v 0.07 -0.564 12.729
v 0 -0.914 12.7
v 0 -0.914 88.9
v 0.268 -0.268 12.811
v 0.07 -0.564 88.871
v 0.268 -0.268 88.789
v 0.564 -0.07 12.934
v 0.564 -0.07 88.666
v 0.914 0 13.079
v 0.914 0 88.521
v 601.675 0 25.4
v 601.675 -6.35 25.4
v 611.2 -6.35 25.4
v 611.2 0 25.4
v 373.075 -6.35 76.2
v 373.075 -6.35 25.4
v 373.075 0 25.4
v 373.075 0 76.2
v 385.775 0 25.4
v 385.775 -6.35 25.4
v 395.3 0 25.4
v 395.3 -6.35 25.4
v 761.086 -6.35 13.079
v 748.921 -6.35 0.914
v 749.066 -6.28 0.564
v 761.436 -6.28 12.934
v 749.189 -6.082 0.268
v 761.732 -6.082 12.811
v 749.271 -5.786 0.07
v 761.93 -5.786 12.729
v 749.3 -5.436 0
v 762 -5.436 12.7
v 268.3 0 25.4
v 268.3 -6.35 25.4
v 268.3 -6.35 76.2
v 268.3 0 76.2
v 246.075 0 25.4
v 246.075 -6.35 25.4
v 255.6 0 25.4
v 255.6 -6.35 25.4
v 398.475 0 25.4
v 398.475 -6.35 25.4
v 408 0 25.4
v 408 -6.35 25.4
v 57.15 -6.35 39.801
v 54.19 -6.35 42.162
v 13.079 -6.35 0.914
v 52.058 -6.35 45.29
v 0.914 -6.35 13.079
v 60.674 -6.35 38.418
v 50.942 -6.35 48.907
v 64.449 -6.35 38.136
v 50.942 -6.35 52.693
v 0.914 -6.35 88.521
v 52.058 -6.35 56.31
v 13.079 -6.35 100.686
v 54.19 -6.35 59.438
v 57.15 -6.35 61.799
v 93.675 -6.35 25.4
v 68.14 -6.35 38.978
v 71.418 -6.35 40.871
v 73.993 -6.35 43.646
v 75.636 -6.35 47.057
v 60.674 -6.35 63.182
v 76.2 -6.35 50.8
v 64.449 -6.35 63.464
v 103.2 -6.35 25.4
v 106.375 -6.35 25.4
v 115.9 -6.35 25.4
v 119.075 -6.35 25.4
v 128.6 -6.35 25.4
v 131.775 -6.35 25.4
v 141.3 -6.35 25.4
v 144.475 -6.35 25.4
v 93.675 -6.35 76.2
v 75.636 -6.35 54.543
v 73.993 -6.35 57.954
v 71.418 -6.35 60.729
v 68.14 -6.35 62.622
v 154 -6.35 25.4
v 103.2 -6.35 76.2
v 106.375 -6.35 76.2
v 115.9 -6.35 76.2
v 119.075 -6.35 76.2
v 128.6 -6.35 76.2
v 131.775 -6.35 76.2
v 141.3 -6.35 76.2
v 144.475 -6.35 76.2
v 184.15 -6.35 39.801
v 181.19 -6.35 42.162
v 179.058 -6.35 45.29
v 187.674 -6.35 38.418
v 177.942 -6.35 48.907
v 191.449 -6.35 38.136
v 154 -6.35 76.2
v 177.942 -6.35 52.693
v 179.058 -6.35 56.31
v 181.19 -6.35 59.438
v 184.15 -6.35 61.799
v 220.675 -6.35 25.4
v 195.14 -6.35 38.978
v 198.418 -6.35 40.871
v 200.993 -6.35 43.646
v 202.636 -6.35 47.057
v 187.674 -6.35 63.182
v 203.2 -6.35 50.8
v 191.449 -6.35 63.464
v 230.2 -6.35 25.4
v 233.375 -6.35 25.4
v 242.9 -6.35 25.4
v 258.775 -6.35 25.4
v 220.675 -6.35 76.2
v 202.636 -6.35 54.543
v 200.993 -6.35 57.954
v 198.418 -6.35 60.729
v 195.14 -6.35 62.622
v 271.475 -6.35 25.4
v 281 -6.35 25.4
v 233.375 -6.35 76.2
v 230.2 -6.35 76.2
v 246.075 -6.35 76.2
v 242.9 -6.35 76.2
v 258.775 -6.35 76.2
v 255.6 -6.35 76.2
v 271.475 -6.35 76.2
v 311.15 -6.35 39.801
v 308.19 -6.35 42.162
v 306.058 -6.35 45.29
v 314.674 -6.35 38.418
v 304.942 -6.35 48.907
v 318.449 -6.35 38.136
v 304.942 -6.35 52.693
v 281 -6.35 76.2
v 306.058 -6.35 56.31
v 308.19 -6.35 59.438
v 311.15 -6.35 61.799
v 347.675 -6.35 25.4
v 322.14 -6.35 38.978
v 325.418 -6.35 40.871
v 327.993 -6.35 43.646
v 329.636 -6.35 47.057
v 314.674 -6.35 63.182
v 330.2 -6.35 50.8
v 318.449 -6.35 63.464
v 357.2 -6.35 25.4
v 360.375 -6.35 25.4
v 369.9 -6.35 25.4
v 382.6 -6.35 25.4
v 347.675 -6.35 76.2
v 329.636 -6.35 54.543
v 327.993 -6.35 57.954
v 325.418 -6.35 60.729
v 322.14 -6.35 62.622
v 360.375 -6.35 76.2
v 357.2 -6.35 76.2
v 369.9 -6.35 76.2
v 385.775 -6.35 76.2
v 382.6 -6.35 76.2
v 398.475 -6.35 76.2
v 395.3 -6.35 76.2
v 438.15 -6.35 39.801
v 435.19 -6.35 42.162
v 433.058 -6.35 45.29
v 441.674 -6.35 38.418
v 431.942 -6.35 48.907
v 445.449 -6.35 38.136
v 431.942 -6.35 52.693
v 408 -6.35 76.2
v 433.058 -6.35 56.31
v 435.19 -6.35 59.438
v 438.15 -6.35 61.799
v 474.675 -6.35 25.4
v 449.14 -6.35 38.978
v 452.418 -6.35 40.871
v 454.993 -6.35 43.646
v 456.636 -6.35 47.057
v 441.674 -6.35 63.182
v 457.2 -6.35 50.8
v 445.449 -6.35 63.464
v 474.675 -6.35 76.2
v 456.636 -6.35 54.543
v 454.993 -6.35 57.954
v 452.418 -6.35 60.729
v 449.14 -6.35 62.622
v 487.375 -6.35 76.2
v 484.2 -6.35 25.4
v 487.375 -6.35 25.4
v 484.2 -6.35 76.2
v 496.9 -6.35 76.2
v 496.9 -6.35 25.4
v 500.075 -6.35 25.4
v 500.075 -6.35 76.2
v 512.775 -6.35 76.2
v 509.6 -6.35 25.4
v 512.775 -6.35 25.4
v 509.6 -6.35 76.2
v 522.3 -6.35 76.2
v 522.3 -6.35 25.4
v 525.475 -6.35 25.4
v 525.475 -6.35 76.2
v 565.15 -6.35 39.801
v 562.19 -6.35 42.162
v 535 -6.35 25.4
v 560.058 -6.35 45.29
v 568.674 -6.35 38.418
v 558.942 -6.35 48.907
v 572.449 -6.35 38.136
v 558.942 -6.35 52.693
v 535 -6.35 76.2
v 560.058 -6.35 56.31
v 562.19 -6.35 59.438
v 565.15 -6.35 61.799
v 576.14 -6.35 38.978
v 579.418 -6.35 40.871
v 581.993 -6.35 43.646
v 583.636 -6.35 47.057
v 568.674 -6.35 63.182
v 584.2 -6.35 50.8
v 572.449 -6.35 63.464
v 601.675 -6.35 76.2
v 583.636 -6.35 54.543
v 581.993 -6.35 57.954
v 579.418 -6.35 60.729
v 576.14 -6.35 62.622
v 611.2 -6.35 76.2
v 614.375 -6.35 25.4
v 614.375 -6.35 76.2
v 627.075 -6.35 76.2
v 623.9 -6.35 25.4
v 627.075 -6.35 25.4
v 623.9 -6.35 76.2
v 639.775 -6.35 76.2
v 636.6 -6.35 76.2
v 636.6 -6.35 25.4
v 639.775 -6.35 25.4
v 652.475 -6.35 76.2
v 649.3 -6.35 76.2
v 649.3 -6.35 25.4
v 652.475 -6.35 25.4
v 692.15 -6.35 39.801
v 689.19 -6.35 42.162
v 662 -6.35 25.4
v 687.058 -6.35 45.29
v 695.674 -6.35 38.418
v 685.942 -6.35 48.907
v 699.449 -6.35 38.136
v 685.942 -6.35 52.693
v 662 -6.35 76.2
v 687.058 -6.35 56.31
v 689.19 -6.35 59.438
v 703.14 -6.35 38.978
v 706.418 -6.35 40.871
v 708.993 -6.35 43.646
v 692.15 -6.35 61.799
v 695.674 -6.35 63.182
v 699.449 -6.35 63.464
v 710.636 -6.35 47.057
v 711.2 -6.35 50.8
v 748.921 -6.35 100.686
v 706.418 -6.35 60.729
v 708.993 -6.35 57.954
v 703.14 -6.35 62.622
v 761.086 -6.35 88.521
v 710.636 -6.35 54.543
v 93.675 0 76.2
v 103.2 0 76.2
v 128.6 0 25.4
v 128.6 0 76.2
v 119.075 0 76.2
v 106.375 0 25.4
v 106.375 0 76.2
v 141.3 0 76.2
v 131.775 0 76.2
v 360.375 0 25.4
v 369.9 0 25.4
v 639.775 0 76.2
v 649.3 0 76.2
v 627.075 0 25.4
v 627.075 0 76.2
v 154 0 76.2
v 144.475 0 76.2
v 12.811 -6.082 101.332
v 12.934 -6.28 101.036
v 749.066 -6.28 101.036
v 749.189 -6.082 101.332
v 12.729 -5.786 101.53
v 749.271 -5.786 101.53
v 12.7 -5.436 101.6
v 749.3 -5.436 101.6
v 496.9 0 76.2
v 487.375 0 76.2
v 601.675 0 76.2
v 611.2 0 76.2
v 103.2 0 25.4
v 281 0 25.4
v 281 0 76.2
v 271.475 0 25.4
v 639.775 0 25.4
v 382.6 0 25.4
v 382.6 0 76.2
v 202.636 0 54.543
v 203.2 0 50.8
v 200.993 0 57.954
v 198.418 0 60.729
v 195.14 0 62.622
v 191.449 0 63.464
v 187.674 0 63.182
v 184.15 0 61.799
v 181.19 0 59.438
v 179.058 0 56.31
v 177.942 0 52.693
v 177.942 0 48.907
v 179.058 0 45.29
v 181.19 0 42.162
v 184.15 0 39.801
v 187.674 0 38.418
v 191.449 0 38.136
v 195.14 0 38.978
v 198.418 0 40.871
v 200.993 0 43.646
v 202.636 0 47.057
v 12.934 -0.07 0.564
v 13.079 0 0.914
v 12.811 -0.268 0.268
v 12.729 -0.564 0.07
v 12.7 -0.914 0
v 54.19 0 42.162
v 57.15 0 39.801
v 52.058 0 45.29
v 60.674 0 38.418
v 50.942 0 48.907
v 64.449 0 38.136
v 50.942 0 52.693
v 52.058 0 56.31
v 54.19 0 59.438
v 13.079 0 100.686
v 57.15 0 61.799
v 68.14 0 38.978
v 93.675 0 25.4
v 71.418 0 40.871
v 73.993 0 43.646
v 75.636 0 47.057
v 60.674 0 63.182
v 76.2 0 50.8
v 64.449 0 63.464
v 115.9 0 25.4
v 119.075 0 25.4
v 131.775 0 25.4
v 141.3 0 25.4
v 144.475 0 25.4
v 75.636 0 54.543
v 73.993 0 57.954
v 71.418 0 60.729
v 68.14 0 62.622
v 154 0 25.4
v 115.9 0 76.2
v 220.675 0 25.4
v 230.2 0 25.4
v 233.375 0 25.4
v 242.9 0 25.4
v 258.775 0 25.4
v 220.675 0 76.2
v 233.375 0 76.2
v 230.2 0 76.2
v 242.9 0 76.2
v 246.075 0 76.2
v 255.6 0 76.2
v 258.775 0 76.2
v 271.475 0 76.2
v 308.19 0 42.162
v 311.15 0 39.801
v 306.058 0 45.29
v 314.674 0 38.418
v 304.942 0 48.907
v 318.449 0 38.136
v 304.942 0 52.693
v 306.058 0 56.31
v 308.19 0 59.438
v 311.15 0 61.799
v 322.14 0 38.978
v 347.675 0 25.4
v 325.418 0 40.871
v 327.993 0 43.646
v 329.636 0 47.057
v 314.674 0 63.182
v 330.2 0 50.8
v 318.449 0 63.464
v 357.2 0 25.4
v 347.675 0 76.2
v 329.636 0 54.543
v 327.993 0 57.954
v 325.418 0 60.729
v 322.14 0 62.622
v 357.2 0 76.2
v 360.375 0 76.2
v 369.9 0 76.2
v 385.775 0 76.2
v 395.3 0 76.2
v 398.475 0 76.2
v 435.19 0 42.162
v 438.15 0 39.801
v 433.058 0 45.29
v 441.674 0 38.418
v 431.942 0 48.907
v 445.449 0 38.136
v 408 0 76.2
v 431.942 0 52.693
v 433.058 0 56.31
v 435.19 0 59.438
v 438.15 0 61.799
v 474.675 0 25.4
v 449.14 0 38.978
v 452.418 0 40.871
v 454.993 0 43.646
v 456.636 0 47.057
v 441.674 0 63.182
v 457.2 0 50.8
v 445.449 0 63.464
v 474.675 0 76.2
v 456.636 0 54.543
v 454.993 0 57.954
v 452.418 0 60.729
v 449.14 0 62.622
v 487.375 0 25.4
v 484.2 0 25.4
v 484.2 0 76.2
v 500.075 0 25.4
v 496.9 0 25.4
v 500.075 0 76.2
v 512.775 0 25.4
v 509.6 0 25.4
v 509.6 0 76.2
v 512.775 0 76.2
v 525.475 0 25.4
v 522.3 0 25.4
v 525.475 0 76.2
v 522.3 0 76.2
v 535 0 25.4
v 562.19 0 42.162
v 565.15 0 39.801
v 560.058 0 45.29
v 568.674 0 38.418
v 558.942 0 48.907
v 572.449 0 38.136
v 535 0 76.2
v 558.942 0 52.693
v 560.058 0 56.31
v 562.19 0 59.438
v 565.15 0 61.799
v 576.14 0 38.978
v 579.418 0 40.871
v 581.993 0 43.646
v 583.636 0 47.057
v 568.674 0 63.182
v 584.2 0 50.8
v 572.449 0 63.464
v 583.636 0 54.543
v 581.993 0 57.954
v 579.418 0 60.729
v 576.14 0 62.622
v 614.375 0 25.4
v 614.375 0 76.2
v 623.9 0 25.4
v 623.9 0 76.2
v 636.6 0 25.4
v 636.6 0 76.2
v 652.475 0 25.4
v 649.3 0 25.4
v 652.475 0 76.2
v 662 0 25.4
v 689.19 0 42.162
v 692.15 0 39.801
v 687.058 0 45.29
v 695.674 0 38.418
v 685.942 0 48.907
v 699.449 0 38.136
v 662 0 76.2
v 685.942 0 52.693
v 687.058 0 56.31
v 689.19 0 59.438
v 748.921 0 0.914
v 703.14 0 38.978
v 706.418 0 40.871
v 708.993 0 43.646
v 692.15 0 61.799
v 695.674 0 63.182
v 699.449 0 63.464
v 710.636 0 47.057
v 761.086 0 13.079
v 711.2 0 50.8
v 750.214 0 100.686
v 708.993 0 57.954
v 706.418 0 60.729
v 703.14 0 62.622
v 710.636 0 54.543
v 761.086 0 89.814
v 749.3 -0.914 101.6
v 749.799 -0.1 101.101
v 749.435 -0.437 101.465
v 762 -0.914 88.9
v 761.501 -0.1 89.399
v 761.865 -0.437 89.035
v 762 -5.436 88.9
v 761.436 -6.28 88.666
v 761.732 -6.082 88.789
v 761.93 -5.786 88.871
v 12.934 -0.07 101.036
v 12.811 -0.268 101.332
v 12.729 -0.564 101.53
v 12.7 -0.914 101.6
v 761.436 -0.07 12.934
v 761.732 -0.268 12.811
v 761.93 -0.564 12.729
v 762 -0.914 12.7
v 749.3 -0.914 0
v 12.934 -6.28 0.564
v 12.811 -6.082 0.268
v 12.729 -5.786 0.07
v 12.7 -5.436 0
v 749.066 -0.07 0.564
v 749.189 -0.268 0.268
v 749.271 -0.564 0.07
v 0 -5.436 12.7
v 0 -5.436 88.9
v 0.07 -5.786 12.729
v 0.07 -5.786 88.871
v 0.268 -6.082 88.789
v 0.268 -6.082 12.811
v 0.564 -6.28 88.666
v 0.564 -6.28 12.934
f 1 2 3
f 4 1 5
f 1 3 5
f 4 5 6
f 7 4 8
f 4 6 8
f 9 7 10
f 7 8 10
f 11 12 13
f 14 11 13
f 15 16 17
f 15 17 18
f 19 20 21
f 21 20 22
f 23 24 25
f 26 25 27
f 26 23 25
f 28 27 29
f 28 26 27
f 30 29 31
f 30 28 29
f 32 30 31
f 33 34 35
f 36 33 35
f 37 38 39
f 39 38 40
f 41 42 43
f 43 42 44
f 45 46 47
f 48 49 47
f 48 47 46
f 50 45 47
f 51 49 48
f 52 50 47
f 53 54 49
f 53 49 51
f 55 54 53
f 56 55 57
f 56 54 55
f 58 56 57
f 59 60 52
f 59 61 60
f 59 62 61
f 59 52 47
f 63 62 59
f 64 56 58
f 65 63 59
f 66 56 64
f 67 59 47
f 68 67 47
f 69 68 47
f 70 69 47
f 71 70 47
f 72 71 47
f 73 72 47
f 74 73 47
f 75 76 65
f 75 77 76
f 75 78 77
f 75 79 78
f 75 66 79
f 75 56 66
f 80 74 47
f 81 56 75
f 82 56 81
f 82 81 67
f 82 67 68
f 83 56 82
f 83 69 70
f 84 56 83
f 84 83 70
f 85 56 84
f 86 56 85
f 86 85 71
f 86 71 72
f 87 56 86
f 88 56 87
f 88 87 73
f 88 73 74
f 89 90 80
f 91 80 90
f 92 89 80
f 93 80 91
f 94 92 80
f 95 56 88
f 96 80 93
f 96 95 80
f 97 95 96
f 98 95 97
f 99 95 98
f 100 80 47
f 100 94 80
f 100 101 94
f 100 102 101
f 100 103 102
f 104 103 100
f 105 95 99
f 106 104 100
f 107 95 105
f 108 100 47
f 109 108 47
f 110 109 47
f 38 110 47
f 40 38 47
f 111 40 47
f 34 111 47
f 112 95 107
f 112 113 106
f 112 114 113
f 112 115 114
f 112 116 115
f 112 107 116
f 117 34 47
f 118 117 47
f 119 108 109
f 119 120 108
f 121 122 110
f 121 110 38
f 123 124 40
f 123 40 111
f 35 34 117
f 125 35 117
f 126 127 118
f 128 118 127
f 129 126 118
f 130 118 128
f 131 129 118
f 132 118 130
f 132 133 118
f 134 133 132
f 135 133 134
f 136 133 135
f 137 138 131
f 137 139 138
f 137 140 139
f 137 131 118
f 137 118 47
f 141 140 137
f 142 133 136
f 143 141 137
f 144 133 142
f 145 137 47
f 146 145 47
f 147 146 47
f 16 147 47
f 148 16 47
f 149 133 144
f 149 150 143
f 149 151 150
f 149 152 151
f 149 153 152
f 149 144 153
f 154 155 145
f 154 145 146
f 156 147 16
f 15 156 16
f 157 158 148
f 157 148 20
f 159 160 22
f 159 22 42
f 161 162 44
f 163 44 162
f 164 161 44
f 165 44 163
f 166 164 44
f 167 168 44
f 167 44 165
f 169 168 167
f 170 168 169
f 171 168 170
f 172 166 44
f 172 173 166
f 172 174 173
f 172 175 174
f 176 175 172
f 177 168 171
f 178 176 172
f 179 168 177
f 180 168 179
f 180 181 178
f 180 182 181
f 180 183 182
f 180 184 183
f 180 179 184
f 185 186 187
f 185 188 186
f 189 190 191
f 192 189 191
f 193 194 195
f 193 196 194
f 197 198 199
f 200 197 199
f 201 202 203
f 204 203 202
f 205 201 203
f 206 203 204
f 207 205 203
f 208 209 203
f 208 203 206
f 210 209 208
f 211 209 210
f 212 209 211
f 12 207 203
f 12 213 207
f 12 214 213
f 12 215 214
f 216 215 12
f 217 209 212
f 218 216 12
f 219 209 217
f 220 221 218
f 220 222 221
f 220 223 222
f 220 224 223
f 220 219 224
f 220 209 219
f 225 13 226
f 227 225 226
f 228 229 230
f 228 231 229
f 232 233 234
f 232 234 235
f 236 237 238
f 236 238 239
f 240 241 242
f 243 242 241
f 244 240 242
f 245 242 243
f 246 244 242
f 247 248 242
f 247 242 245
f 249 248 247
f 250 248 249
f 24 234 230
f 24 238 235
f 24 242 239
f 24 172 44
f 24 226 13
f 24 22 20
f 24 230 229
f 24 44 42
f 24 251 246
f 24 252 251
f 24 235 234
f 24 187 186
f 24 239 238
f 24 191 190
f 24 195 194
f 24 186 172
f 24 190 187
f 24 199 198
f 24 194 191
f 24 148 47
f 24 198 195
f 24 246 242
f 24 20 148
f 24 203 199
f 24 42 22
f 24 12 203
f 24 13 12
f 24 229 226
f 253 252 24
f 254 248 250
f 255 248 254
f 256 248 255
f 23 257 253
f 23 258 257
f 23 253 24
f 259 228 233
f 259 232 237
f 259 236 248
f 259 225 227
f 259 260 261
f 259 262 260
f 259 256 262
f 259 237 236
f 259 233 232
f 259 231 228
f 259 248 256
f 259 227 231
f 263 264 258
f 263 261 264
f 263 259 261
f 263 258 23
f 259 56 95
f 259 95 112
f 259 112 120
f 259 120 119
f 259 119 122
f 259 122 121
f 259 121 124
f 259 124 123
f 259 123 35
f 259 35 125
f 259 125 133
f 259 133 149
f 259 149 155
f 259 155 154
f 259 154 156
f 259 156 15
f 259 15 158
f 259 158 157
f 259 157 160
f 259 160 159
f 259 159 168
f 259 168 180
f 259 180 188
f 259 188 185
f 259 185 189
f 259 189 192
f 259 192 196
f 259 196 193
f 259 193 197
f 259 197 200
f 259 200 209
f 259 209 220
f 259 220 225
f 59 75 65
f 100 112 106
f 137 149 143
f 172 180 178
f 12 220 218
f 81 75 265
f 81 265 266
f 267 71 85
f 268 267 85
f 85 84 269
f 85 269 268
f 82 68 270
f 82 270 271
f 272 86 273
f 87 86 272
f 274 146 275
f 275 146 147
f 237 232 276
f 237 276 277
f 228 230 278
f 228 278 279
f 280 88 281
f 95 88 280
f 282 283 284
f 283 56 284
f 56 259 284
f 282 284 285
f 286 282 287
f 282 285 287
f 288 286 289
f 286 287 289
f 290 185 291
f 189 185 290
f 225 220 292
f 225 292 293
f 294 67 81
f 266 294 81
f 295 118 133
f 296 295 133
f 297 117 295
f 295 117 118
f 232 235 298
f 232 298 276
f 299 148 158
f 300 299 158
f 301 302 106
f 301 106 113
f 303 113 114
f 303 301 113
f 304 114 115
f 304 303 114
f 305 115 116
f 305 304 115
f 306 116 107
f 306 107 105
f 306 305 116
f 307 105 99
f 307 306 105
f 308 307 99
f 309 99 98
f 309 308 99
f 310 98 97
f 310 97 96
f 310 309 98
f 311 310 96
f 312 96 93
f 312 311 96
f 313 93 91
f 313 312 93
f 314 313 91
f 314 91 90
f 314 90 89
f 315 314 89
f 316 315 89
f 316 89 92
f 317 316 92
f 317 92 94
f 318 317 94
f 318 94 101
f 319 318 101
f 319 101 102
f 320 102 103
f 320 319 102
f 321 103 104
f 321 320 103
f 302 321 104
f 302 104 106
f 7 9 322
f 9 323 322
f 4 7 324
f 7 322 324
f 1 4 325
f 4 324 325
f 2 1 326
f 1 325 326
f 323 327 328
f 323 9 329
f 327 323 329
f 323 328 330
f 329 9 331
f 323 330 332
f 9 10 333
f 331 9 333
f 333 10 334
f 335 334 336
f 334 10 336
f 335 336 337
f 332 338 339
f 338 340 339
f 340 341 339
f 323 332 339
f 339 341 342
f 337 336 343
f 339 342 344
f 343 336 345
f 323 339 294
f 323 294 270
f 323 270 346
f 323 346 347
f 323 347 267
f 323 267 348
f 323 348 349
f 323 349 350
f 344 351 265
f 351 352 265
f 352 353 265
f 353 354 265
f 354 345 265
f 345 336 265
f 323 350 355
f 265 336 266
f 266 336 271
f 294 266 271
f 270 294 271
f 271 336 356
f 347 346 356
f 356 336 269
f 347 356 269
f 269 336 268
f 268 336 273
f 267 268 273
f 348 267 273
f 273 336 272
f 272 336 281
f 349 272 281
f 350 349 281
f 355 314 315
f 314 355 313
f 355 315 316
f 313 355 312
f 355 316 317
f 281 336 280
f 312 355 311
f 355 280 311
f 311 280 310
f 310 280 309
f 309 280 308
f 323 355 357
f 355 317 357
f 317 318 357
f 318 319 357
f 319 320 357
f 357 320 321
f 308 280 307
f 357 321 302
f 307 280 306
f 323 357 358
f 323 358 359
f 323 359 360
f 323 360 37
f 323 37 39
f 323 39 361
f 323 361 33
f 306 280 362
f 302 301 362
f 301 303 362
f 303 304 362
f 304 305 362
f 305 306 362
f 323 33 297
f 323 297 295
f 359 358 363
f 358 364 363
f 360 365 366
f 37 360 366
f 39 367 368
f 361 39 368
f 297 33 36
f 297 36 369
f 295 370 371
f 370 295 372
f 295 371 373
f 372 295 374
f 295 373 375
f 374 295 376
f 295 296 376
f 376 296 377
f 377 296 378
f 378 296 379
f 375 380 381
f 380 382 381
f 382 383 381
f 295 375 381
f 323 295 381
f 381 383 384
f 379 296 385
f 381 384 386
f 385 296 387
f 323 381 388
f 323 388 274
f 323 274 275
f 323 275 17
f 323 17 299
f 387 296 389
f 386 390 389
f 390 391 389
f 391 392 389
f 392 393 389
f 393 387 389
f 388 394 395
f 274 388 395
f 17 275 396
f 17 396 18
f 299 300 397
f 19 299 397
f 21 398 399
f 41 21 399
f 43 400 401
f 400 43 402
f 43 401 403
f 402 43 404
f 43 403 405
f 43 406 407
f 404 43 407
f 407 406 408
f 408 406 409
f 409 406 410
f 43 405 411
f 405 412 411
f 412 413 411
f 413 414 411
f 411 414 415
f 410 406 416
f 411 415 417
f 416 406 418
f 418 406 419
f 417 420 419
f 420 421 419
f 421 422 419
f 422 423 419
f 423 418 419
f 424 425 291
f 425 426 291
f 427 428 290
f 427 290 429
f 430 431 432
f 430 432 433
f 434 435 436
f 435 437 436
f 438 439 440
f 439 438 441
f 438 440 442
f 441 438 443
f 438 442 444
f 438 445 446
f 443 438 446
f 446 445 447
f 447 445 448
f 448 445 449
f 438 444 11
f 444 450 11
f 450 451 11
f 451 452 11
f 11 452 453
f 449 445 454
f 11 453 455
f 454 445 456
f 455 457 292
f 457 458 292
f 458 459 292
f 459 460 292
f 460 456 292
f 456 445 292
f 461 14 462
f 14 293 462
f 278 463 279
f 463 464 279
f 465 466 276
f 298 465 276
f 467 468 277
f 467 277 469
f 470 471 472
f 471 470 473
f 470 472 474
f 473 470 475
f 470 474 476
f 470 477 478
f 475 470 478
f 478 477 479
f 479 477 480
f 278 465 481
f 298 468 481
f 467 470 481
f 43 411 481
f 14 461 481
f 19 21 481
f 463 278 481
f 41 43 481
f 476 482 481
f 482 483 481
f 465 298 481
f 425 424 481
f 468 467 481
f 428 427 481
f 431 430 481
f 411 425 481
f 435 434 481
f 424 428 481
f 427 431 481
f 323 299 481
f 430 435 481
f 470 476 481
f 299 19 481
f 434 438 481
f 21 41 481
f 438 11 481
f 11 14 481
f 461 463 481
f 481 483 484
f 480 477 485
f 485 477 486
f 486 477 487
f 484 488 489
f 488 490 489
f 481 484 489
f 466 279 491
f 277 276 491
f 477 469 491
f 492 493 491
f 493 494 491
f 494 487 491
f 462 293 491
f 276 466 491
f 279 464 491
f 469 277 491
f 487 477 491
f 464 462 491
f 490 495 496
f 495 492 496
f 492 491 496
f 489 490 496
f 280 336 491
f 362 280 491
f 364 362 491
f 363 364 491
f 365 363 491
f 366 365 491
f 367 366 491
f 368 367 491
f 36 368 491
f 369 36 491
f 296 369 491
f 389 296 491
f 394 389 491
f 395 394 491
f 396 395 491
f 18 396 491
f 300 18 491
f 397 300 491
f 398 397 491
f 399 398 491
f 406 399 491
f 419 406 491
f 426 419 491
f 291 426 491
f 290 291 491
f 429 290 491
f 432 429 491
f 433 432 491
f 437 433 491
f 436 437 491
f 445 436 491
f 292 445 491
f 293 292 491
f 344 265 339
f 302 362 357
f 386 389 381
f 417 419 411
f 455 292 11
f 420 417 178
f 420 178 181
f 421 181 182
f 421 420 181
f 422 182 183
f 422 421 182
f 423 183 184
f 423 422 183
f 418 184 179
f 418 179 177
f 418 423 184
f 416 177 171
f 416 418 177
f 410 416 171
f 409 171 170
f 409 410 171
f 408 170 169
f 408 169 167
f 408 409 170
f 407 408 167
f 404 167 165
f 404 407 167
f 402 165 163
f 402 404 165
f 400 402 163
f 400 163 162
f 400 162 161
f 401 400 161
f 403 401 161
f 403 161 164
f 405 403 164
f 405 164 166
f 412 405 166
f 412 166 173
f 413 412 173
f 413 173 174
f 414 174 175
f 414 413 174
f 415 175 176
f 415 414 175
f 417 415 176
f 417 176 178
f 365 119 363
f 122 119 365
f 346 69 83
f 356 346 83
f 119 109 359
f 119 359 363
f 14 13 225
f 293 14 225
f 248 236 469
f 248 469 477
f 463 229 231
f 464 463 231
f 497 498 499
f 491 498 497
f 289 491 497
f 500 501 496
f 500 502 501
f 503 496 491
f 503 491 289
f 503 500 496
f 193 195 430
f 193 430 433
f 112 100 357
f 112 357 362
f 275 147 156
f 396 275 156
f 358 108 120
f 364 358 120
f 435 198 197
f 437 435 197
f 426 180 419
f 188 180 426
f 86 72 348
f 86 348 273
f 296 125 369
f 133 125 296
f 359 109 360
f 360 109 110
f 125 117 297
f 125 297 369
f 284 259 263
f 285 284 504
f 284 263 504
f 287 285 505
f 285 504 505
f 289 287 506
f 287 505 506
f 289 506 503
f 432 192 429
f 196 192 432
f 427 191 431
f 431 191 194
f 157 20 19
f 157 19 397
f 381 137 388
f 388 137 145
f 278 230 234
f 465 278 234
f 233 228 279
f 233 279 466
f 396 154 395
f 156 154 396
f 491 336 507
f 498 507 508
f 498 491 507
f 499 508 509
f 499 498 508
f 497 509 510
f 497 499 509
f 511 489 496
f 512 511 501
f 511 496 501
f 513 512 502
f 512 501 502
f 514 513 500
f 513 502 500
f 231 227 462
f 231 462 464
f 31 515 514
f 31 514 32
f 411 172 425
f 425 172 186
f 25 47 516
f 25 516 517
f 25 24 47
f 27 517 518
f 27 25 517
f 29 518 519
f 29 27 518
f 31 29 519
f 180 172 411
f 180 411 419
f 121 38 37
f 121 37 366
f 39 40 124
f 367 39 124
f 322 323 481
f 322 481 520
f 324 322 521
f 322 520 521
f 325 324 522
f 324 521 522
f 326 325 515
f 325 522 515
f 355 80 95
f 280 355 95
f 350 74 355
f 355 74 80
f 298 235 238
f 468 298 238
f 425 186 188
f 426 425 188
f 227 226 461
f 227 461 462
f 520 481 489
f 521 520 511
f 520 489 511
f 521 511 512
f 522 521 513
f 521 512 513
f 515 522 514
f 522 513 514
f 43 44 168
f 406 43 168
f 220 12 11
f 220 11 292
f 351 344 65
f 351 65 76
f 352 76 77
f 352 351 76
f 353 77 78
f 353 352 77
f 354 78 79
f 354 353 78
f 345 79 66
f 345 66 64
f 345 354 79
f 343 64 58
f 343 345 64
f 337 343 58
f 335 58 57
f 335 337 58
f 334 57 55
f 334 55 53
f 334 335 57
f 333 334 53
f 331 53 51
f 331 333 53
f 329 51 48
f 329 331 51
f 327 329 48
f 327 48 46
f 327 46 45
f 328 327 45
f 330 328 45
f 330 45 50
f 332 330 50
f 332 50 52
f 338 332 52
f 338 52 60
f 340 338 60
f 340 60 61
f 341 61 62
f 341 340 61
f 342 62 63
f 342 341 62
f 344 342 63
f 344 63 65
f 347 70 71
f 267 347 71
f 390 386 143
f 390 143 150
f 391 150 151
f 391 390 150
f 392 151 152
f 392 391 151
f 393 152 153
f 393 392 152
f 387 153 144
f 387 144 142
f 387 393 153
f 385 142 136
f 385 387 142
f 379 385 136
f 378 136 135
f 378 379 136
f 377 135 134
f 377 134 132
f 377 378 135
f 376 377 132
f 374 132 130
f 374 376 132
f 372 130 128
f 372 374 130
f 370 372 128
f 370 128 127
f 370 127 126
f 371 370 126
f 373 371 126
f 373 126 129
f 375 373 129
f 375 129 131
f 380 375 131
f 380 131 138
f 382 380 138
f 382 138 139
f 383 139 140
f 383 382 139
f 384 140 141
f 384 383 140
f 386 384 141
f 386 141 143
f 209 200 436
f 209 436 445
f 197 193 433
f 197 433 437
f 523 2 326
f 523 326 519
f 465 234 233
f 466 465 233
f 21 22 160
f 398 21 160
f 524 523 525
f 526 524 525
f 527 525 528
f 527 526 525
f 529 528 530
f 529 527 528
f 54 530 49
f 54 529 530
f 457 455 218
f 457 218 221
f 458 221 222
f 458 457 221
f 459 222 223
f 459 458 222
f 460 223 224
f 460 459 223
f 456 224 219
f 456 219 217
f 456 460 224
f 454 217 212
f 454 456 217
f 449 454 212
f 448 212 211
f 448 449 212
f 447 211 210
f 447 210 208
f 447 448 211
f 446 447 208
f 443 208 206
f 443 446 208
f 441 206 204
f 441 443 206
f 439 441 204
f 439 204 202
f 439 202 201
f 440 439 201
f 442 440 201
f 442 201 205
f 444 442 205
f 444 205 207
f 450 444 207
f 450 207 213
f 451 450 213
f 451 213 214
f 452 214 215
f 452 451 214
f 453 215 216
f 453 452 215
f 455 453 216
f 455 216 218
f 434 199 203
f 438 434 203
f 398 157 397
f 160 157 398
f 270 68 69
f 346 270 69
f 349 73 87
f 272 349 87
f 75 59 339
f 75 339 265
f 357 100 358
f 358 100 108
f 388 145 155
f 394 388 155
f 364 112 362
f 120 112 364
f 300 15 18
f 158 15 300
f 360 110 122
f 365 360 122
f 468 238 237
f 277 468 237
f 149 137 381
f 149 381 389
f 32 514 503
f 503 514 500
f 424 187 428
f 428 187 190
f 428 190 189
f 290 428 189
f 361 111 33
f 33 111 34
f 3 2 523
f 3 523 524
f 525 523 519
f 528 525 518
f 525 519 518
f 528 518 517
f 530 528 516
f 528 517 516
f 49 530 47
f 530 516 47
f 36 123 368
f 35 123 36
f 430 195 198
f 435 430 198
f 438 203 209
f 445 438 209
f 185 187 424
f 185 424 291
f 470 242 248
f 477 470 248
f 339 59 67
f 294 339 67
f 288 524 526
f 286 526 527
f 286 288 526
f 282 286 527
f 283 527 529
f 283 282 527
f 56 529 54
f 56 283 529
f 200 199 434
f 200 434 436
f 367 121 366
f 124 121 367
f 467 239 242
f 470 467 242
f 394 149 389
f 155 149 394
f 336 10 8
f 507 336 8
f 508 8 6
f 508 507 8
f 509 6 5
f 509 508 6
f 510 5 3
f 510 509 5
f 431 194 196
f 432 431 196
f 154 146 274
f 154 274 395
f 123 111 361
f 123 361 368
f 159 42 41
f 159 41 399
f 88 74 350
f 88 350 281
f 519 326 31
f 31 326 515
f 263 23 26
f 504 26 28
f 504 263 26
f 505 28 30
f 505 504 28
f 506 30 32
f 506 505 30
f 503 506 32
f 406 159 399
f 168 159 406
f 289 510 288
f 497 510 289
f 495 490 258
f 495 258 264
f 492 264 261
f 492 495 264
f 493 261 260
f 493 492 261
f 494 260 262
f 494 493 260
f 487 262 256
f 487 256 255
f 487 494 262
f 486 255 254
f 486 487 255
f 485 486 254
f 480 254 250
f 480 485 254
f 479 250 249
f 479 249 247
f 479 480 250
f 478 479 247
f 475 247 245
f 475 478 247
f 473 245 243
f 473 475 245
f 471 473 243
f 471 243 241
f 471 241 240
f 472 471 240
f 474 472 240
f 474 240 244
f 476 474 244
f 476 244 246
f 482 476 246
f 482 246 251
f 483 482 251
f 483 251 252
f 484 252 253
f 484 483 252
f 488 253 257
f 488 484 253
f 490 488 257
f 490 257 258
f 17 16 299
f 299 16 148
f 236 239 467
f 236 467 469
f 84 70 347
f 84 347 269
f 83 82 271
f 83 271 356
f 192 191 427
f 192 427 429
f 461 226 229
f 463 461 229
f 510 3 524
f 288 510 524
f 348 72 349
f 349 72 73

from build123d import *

# Parameters (mm, degrees)
F0_W     = 762
F0_H     = 101.6
F0_R     = 12.7
F1_DEPTH = 6.35
F2_W     = 9.525
F2_H     = 50.8
F3_DEPTH = 25.4
F4_SIZE  = 12.7
F5_R     = 0.9144


with BuildPart() as f1:
    # F0 (on Front) → F1 (new body)
    with BuildSketch(Plane.XZ):
        with Locations((381, 50.8)):
            Rectangle(F0_W, F0_H)
        with Locations((63.5, 50.8)):
            Circle(F0_R, mode=Mode.SUBTRACT)
        with Locations((190.5, 50.8)):
            Circle(F0_R, mode=Mode.SUBTRACT)
        with Locations((317.5, 50.8)):
            Circle(F0_R, mode=Mode.SUBTRACT)
        with Locations((444.5, 50.8)):
            Circle(F0_R, mode=Mode.SUBTRACT)
        with Locations((571.5, 50.8)):
            Circle(F0_R, mode=Mode.SUBTRACT)
        with Locations((698.5, 50.8)):
            Circle(F0_R, mode=Mode.SUBTRACT)
    extrude(amount=F1_DEPTH)

    # F2 (on face) → F3 (cut)
    with BuildSketch(Plane.XZ.offset(6.35)):
        with Locations((98.4377, 50.8)):
            Rectangle(F2_W, F2_H)
        with Locations((111.1377, 50.8)):
            Rectangle(F2_W, F2_H)
        with Locations((123.8377, 50.8)):
            Rectangle(F2_W, F2_H)
        with Locations((136.5377, 50.8)):
            Rectangle(F2_W, F2_H)
        with Locations((149.2377, 50.8)):
            Rectangle(F2_W, F2_H)
        with Locations((225.4377, 50.8)):
            Rectangle(F2_W, F2_H)
        with Locations((238.1377, 50.8)):
            Rectangle(F2_W, F2_H)
        with Locations((250.8377, 50.8)):
            Rectangle(F2_W, F2_H)
        with Locations((263.5377, 50.8)):
            Rectangle(F2_W, F2_H)
        with Locations((276.2377, 50.8)):
            Rectangle(F2_W, F2_H)
        with Locations((352.4377, 50.8)):
            Rectangle(F2_W, F2_H)
        with Locations((365.1377, 50.8)):
            Rectangle(F2_W, F2_H)
        with Locations((377.8377, 50.8)):
            Rectangle(F2_W, F2_H)
        with Locations((390.5377, 50.8)):
            Rectangle(F2_W, F2_H)
        with Locations((403.2377, 50.8)):
            Rectangle(F2_W, F2_H)
        with Locations((479.4377, 50.8)):
            Rectangle(F2_W, F2_H)
        with Locations((492.1377, 50.8)):
            Rectangle(F2_W, F2_H)
        with Locations((504.8377, 50.8)):
            Rectangle(F2_W, F2_H)
        with Locations((517.5377, 50.8)):
            Rectangle(F2_W, F2_H)
        with Locations((530.2377, 50.8)):
            Rectangle(F2_W, F2_H)
        with Locations((606.4377, 50.8)):
            Rectangle(F2_W, F2_H)
        with Locations((619.1377, 50.8)):
            Rectangle(F2_W, F2_H)
        with Locations((631.8377, 50.8)):
            Rectangle(F2_W, F2_H)
        with Locations((644.5377, 50.8)):
            Rectangle(F2_W, F2_H)
        with Locations((657.2377, 50.8)):
            Rectangle(F2_W, F2_H)
    extrude(amount=-F3_DEPTH, mode=Mode.SUBTRACT)

    # F4
    f4_edges = [f1.edges().sort_by_distance(p)[0] for p in [
        (762, -3.175, 101.6),
        (762, -3.175, 0),
        (0, -3.175, 0),
        (0, -3.175, 101.6),
    ]]
    chamfer(f4_edges, length=F4_SIZE)

    # F5
    f5_edges = [f1.edges().sort_by_distance(p)[0] for p in [
        (6.35, -6.35, 95.25),
        (381, -6.35, 101.6),
        (0, 0, 50.8),
        (381, -6.35, 0),
        (6.35, -6.35, 6.35),
        (755.65, -6.35, 95.25),
        (755.65, -6.35, 6.35),
        (762, -6.35, 50.8),
        (381, 0, 101.6),
        (6.35, 0, 95.25),
        (0, -6.35, 50.8),
        (6.35, 0, 6.35),
        (381, 0, 0),
        (755.65, 0, 6.35),
        (762, 0, 50.8),
    ]]
    fillet(f5_edges, radius=F5_R)


solid = f1.part
